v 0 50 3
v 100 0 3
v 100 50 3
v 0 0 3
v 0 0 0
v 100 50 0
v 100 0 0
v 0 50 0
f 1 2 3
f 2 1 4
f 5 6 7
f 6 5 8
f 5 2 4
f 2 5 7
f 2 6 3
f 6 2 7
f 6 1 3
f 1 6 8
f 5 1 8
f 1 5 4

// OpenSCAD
// Test Fixture: SCAD file with version comment
// Version: v74
// Author: Test Suite

/* [Dimensions] */
width = 100; // [50:200]
height = 50; // [25:100]
thickness = 3; // [1:10]

/* [Hidden] */
$fn = 32;

module versioned_part() {
    cube([width, height, thickness]);
}

versioned_part();
